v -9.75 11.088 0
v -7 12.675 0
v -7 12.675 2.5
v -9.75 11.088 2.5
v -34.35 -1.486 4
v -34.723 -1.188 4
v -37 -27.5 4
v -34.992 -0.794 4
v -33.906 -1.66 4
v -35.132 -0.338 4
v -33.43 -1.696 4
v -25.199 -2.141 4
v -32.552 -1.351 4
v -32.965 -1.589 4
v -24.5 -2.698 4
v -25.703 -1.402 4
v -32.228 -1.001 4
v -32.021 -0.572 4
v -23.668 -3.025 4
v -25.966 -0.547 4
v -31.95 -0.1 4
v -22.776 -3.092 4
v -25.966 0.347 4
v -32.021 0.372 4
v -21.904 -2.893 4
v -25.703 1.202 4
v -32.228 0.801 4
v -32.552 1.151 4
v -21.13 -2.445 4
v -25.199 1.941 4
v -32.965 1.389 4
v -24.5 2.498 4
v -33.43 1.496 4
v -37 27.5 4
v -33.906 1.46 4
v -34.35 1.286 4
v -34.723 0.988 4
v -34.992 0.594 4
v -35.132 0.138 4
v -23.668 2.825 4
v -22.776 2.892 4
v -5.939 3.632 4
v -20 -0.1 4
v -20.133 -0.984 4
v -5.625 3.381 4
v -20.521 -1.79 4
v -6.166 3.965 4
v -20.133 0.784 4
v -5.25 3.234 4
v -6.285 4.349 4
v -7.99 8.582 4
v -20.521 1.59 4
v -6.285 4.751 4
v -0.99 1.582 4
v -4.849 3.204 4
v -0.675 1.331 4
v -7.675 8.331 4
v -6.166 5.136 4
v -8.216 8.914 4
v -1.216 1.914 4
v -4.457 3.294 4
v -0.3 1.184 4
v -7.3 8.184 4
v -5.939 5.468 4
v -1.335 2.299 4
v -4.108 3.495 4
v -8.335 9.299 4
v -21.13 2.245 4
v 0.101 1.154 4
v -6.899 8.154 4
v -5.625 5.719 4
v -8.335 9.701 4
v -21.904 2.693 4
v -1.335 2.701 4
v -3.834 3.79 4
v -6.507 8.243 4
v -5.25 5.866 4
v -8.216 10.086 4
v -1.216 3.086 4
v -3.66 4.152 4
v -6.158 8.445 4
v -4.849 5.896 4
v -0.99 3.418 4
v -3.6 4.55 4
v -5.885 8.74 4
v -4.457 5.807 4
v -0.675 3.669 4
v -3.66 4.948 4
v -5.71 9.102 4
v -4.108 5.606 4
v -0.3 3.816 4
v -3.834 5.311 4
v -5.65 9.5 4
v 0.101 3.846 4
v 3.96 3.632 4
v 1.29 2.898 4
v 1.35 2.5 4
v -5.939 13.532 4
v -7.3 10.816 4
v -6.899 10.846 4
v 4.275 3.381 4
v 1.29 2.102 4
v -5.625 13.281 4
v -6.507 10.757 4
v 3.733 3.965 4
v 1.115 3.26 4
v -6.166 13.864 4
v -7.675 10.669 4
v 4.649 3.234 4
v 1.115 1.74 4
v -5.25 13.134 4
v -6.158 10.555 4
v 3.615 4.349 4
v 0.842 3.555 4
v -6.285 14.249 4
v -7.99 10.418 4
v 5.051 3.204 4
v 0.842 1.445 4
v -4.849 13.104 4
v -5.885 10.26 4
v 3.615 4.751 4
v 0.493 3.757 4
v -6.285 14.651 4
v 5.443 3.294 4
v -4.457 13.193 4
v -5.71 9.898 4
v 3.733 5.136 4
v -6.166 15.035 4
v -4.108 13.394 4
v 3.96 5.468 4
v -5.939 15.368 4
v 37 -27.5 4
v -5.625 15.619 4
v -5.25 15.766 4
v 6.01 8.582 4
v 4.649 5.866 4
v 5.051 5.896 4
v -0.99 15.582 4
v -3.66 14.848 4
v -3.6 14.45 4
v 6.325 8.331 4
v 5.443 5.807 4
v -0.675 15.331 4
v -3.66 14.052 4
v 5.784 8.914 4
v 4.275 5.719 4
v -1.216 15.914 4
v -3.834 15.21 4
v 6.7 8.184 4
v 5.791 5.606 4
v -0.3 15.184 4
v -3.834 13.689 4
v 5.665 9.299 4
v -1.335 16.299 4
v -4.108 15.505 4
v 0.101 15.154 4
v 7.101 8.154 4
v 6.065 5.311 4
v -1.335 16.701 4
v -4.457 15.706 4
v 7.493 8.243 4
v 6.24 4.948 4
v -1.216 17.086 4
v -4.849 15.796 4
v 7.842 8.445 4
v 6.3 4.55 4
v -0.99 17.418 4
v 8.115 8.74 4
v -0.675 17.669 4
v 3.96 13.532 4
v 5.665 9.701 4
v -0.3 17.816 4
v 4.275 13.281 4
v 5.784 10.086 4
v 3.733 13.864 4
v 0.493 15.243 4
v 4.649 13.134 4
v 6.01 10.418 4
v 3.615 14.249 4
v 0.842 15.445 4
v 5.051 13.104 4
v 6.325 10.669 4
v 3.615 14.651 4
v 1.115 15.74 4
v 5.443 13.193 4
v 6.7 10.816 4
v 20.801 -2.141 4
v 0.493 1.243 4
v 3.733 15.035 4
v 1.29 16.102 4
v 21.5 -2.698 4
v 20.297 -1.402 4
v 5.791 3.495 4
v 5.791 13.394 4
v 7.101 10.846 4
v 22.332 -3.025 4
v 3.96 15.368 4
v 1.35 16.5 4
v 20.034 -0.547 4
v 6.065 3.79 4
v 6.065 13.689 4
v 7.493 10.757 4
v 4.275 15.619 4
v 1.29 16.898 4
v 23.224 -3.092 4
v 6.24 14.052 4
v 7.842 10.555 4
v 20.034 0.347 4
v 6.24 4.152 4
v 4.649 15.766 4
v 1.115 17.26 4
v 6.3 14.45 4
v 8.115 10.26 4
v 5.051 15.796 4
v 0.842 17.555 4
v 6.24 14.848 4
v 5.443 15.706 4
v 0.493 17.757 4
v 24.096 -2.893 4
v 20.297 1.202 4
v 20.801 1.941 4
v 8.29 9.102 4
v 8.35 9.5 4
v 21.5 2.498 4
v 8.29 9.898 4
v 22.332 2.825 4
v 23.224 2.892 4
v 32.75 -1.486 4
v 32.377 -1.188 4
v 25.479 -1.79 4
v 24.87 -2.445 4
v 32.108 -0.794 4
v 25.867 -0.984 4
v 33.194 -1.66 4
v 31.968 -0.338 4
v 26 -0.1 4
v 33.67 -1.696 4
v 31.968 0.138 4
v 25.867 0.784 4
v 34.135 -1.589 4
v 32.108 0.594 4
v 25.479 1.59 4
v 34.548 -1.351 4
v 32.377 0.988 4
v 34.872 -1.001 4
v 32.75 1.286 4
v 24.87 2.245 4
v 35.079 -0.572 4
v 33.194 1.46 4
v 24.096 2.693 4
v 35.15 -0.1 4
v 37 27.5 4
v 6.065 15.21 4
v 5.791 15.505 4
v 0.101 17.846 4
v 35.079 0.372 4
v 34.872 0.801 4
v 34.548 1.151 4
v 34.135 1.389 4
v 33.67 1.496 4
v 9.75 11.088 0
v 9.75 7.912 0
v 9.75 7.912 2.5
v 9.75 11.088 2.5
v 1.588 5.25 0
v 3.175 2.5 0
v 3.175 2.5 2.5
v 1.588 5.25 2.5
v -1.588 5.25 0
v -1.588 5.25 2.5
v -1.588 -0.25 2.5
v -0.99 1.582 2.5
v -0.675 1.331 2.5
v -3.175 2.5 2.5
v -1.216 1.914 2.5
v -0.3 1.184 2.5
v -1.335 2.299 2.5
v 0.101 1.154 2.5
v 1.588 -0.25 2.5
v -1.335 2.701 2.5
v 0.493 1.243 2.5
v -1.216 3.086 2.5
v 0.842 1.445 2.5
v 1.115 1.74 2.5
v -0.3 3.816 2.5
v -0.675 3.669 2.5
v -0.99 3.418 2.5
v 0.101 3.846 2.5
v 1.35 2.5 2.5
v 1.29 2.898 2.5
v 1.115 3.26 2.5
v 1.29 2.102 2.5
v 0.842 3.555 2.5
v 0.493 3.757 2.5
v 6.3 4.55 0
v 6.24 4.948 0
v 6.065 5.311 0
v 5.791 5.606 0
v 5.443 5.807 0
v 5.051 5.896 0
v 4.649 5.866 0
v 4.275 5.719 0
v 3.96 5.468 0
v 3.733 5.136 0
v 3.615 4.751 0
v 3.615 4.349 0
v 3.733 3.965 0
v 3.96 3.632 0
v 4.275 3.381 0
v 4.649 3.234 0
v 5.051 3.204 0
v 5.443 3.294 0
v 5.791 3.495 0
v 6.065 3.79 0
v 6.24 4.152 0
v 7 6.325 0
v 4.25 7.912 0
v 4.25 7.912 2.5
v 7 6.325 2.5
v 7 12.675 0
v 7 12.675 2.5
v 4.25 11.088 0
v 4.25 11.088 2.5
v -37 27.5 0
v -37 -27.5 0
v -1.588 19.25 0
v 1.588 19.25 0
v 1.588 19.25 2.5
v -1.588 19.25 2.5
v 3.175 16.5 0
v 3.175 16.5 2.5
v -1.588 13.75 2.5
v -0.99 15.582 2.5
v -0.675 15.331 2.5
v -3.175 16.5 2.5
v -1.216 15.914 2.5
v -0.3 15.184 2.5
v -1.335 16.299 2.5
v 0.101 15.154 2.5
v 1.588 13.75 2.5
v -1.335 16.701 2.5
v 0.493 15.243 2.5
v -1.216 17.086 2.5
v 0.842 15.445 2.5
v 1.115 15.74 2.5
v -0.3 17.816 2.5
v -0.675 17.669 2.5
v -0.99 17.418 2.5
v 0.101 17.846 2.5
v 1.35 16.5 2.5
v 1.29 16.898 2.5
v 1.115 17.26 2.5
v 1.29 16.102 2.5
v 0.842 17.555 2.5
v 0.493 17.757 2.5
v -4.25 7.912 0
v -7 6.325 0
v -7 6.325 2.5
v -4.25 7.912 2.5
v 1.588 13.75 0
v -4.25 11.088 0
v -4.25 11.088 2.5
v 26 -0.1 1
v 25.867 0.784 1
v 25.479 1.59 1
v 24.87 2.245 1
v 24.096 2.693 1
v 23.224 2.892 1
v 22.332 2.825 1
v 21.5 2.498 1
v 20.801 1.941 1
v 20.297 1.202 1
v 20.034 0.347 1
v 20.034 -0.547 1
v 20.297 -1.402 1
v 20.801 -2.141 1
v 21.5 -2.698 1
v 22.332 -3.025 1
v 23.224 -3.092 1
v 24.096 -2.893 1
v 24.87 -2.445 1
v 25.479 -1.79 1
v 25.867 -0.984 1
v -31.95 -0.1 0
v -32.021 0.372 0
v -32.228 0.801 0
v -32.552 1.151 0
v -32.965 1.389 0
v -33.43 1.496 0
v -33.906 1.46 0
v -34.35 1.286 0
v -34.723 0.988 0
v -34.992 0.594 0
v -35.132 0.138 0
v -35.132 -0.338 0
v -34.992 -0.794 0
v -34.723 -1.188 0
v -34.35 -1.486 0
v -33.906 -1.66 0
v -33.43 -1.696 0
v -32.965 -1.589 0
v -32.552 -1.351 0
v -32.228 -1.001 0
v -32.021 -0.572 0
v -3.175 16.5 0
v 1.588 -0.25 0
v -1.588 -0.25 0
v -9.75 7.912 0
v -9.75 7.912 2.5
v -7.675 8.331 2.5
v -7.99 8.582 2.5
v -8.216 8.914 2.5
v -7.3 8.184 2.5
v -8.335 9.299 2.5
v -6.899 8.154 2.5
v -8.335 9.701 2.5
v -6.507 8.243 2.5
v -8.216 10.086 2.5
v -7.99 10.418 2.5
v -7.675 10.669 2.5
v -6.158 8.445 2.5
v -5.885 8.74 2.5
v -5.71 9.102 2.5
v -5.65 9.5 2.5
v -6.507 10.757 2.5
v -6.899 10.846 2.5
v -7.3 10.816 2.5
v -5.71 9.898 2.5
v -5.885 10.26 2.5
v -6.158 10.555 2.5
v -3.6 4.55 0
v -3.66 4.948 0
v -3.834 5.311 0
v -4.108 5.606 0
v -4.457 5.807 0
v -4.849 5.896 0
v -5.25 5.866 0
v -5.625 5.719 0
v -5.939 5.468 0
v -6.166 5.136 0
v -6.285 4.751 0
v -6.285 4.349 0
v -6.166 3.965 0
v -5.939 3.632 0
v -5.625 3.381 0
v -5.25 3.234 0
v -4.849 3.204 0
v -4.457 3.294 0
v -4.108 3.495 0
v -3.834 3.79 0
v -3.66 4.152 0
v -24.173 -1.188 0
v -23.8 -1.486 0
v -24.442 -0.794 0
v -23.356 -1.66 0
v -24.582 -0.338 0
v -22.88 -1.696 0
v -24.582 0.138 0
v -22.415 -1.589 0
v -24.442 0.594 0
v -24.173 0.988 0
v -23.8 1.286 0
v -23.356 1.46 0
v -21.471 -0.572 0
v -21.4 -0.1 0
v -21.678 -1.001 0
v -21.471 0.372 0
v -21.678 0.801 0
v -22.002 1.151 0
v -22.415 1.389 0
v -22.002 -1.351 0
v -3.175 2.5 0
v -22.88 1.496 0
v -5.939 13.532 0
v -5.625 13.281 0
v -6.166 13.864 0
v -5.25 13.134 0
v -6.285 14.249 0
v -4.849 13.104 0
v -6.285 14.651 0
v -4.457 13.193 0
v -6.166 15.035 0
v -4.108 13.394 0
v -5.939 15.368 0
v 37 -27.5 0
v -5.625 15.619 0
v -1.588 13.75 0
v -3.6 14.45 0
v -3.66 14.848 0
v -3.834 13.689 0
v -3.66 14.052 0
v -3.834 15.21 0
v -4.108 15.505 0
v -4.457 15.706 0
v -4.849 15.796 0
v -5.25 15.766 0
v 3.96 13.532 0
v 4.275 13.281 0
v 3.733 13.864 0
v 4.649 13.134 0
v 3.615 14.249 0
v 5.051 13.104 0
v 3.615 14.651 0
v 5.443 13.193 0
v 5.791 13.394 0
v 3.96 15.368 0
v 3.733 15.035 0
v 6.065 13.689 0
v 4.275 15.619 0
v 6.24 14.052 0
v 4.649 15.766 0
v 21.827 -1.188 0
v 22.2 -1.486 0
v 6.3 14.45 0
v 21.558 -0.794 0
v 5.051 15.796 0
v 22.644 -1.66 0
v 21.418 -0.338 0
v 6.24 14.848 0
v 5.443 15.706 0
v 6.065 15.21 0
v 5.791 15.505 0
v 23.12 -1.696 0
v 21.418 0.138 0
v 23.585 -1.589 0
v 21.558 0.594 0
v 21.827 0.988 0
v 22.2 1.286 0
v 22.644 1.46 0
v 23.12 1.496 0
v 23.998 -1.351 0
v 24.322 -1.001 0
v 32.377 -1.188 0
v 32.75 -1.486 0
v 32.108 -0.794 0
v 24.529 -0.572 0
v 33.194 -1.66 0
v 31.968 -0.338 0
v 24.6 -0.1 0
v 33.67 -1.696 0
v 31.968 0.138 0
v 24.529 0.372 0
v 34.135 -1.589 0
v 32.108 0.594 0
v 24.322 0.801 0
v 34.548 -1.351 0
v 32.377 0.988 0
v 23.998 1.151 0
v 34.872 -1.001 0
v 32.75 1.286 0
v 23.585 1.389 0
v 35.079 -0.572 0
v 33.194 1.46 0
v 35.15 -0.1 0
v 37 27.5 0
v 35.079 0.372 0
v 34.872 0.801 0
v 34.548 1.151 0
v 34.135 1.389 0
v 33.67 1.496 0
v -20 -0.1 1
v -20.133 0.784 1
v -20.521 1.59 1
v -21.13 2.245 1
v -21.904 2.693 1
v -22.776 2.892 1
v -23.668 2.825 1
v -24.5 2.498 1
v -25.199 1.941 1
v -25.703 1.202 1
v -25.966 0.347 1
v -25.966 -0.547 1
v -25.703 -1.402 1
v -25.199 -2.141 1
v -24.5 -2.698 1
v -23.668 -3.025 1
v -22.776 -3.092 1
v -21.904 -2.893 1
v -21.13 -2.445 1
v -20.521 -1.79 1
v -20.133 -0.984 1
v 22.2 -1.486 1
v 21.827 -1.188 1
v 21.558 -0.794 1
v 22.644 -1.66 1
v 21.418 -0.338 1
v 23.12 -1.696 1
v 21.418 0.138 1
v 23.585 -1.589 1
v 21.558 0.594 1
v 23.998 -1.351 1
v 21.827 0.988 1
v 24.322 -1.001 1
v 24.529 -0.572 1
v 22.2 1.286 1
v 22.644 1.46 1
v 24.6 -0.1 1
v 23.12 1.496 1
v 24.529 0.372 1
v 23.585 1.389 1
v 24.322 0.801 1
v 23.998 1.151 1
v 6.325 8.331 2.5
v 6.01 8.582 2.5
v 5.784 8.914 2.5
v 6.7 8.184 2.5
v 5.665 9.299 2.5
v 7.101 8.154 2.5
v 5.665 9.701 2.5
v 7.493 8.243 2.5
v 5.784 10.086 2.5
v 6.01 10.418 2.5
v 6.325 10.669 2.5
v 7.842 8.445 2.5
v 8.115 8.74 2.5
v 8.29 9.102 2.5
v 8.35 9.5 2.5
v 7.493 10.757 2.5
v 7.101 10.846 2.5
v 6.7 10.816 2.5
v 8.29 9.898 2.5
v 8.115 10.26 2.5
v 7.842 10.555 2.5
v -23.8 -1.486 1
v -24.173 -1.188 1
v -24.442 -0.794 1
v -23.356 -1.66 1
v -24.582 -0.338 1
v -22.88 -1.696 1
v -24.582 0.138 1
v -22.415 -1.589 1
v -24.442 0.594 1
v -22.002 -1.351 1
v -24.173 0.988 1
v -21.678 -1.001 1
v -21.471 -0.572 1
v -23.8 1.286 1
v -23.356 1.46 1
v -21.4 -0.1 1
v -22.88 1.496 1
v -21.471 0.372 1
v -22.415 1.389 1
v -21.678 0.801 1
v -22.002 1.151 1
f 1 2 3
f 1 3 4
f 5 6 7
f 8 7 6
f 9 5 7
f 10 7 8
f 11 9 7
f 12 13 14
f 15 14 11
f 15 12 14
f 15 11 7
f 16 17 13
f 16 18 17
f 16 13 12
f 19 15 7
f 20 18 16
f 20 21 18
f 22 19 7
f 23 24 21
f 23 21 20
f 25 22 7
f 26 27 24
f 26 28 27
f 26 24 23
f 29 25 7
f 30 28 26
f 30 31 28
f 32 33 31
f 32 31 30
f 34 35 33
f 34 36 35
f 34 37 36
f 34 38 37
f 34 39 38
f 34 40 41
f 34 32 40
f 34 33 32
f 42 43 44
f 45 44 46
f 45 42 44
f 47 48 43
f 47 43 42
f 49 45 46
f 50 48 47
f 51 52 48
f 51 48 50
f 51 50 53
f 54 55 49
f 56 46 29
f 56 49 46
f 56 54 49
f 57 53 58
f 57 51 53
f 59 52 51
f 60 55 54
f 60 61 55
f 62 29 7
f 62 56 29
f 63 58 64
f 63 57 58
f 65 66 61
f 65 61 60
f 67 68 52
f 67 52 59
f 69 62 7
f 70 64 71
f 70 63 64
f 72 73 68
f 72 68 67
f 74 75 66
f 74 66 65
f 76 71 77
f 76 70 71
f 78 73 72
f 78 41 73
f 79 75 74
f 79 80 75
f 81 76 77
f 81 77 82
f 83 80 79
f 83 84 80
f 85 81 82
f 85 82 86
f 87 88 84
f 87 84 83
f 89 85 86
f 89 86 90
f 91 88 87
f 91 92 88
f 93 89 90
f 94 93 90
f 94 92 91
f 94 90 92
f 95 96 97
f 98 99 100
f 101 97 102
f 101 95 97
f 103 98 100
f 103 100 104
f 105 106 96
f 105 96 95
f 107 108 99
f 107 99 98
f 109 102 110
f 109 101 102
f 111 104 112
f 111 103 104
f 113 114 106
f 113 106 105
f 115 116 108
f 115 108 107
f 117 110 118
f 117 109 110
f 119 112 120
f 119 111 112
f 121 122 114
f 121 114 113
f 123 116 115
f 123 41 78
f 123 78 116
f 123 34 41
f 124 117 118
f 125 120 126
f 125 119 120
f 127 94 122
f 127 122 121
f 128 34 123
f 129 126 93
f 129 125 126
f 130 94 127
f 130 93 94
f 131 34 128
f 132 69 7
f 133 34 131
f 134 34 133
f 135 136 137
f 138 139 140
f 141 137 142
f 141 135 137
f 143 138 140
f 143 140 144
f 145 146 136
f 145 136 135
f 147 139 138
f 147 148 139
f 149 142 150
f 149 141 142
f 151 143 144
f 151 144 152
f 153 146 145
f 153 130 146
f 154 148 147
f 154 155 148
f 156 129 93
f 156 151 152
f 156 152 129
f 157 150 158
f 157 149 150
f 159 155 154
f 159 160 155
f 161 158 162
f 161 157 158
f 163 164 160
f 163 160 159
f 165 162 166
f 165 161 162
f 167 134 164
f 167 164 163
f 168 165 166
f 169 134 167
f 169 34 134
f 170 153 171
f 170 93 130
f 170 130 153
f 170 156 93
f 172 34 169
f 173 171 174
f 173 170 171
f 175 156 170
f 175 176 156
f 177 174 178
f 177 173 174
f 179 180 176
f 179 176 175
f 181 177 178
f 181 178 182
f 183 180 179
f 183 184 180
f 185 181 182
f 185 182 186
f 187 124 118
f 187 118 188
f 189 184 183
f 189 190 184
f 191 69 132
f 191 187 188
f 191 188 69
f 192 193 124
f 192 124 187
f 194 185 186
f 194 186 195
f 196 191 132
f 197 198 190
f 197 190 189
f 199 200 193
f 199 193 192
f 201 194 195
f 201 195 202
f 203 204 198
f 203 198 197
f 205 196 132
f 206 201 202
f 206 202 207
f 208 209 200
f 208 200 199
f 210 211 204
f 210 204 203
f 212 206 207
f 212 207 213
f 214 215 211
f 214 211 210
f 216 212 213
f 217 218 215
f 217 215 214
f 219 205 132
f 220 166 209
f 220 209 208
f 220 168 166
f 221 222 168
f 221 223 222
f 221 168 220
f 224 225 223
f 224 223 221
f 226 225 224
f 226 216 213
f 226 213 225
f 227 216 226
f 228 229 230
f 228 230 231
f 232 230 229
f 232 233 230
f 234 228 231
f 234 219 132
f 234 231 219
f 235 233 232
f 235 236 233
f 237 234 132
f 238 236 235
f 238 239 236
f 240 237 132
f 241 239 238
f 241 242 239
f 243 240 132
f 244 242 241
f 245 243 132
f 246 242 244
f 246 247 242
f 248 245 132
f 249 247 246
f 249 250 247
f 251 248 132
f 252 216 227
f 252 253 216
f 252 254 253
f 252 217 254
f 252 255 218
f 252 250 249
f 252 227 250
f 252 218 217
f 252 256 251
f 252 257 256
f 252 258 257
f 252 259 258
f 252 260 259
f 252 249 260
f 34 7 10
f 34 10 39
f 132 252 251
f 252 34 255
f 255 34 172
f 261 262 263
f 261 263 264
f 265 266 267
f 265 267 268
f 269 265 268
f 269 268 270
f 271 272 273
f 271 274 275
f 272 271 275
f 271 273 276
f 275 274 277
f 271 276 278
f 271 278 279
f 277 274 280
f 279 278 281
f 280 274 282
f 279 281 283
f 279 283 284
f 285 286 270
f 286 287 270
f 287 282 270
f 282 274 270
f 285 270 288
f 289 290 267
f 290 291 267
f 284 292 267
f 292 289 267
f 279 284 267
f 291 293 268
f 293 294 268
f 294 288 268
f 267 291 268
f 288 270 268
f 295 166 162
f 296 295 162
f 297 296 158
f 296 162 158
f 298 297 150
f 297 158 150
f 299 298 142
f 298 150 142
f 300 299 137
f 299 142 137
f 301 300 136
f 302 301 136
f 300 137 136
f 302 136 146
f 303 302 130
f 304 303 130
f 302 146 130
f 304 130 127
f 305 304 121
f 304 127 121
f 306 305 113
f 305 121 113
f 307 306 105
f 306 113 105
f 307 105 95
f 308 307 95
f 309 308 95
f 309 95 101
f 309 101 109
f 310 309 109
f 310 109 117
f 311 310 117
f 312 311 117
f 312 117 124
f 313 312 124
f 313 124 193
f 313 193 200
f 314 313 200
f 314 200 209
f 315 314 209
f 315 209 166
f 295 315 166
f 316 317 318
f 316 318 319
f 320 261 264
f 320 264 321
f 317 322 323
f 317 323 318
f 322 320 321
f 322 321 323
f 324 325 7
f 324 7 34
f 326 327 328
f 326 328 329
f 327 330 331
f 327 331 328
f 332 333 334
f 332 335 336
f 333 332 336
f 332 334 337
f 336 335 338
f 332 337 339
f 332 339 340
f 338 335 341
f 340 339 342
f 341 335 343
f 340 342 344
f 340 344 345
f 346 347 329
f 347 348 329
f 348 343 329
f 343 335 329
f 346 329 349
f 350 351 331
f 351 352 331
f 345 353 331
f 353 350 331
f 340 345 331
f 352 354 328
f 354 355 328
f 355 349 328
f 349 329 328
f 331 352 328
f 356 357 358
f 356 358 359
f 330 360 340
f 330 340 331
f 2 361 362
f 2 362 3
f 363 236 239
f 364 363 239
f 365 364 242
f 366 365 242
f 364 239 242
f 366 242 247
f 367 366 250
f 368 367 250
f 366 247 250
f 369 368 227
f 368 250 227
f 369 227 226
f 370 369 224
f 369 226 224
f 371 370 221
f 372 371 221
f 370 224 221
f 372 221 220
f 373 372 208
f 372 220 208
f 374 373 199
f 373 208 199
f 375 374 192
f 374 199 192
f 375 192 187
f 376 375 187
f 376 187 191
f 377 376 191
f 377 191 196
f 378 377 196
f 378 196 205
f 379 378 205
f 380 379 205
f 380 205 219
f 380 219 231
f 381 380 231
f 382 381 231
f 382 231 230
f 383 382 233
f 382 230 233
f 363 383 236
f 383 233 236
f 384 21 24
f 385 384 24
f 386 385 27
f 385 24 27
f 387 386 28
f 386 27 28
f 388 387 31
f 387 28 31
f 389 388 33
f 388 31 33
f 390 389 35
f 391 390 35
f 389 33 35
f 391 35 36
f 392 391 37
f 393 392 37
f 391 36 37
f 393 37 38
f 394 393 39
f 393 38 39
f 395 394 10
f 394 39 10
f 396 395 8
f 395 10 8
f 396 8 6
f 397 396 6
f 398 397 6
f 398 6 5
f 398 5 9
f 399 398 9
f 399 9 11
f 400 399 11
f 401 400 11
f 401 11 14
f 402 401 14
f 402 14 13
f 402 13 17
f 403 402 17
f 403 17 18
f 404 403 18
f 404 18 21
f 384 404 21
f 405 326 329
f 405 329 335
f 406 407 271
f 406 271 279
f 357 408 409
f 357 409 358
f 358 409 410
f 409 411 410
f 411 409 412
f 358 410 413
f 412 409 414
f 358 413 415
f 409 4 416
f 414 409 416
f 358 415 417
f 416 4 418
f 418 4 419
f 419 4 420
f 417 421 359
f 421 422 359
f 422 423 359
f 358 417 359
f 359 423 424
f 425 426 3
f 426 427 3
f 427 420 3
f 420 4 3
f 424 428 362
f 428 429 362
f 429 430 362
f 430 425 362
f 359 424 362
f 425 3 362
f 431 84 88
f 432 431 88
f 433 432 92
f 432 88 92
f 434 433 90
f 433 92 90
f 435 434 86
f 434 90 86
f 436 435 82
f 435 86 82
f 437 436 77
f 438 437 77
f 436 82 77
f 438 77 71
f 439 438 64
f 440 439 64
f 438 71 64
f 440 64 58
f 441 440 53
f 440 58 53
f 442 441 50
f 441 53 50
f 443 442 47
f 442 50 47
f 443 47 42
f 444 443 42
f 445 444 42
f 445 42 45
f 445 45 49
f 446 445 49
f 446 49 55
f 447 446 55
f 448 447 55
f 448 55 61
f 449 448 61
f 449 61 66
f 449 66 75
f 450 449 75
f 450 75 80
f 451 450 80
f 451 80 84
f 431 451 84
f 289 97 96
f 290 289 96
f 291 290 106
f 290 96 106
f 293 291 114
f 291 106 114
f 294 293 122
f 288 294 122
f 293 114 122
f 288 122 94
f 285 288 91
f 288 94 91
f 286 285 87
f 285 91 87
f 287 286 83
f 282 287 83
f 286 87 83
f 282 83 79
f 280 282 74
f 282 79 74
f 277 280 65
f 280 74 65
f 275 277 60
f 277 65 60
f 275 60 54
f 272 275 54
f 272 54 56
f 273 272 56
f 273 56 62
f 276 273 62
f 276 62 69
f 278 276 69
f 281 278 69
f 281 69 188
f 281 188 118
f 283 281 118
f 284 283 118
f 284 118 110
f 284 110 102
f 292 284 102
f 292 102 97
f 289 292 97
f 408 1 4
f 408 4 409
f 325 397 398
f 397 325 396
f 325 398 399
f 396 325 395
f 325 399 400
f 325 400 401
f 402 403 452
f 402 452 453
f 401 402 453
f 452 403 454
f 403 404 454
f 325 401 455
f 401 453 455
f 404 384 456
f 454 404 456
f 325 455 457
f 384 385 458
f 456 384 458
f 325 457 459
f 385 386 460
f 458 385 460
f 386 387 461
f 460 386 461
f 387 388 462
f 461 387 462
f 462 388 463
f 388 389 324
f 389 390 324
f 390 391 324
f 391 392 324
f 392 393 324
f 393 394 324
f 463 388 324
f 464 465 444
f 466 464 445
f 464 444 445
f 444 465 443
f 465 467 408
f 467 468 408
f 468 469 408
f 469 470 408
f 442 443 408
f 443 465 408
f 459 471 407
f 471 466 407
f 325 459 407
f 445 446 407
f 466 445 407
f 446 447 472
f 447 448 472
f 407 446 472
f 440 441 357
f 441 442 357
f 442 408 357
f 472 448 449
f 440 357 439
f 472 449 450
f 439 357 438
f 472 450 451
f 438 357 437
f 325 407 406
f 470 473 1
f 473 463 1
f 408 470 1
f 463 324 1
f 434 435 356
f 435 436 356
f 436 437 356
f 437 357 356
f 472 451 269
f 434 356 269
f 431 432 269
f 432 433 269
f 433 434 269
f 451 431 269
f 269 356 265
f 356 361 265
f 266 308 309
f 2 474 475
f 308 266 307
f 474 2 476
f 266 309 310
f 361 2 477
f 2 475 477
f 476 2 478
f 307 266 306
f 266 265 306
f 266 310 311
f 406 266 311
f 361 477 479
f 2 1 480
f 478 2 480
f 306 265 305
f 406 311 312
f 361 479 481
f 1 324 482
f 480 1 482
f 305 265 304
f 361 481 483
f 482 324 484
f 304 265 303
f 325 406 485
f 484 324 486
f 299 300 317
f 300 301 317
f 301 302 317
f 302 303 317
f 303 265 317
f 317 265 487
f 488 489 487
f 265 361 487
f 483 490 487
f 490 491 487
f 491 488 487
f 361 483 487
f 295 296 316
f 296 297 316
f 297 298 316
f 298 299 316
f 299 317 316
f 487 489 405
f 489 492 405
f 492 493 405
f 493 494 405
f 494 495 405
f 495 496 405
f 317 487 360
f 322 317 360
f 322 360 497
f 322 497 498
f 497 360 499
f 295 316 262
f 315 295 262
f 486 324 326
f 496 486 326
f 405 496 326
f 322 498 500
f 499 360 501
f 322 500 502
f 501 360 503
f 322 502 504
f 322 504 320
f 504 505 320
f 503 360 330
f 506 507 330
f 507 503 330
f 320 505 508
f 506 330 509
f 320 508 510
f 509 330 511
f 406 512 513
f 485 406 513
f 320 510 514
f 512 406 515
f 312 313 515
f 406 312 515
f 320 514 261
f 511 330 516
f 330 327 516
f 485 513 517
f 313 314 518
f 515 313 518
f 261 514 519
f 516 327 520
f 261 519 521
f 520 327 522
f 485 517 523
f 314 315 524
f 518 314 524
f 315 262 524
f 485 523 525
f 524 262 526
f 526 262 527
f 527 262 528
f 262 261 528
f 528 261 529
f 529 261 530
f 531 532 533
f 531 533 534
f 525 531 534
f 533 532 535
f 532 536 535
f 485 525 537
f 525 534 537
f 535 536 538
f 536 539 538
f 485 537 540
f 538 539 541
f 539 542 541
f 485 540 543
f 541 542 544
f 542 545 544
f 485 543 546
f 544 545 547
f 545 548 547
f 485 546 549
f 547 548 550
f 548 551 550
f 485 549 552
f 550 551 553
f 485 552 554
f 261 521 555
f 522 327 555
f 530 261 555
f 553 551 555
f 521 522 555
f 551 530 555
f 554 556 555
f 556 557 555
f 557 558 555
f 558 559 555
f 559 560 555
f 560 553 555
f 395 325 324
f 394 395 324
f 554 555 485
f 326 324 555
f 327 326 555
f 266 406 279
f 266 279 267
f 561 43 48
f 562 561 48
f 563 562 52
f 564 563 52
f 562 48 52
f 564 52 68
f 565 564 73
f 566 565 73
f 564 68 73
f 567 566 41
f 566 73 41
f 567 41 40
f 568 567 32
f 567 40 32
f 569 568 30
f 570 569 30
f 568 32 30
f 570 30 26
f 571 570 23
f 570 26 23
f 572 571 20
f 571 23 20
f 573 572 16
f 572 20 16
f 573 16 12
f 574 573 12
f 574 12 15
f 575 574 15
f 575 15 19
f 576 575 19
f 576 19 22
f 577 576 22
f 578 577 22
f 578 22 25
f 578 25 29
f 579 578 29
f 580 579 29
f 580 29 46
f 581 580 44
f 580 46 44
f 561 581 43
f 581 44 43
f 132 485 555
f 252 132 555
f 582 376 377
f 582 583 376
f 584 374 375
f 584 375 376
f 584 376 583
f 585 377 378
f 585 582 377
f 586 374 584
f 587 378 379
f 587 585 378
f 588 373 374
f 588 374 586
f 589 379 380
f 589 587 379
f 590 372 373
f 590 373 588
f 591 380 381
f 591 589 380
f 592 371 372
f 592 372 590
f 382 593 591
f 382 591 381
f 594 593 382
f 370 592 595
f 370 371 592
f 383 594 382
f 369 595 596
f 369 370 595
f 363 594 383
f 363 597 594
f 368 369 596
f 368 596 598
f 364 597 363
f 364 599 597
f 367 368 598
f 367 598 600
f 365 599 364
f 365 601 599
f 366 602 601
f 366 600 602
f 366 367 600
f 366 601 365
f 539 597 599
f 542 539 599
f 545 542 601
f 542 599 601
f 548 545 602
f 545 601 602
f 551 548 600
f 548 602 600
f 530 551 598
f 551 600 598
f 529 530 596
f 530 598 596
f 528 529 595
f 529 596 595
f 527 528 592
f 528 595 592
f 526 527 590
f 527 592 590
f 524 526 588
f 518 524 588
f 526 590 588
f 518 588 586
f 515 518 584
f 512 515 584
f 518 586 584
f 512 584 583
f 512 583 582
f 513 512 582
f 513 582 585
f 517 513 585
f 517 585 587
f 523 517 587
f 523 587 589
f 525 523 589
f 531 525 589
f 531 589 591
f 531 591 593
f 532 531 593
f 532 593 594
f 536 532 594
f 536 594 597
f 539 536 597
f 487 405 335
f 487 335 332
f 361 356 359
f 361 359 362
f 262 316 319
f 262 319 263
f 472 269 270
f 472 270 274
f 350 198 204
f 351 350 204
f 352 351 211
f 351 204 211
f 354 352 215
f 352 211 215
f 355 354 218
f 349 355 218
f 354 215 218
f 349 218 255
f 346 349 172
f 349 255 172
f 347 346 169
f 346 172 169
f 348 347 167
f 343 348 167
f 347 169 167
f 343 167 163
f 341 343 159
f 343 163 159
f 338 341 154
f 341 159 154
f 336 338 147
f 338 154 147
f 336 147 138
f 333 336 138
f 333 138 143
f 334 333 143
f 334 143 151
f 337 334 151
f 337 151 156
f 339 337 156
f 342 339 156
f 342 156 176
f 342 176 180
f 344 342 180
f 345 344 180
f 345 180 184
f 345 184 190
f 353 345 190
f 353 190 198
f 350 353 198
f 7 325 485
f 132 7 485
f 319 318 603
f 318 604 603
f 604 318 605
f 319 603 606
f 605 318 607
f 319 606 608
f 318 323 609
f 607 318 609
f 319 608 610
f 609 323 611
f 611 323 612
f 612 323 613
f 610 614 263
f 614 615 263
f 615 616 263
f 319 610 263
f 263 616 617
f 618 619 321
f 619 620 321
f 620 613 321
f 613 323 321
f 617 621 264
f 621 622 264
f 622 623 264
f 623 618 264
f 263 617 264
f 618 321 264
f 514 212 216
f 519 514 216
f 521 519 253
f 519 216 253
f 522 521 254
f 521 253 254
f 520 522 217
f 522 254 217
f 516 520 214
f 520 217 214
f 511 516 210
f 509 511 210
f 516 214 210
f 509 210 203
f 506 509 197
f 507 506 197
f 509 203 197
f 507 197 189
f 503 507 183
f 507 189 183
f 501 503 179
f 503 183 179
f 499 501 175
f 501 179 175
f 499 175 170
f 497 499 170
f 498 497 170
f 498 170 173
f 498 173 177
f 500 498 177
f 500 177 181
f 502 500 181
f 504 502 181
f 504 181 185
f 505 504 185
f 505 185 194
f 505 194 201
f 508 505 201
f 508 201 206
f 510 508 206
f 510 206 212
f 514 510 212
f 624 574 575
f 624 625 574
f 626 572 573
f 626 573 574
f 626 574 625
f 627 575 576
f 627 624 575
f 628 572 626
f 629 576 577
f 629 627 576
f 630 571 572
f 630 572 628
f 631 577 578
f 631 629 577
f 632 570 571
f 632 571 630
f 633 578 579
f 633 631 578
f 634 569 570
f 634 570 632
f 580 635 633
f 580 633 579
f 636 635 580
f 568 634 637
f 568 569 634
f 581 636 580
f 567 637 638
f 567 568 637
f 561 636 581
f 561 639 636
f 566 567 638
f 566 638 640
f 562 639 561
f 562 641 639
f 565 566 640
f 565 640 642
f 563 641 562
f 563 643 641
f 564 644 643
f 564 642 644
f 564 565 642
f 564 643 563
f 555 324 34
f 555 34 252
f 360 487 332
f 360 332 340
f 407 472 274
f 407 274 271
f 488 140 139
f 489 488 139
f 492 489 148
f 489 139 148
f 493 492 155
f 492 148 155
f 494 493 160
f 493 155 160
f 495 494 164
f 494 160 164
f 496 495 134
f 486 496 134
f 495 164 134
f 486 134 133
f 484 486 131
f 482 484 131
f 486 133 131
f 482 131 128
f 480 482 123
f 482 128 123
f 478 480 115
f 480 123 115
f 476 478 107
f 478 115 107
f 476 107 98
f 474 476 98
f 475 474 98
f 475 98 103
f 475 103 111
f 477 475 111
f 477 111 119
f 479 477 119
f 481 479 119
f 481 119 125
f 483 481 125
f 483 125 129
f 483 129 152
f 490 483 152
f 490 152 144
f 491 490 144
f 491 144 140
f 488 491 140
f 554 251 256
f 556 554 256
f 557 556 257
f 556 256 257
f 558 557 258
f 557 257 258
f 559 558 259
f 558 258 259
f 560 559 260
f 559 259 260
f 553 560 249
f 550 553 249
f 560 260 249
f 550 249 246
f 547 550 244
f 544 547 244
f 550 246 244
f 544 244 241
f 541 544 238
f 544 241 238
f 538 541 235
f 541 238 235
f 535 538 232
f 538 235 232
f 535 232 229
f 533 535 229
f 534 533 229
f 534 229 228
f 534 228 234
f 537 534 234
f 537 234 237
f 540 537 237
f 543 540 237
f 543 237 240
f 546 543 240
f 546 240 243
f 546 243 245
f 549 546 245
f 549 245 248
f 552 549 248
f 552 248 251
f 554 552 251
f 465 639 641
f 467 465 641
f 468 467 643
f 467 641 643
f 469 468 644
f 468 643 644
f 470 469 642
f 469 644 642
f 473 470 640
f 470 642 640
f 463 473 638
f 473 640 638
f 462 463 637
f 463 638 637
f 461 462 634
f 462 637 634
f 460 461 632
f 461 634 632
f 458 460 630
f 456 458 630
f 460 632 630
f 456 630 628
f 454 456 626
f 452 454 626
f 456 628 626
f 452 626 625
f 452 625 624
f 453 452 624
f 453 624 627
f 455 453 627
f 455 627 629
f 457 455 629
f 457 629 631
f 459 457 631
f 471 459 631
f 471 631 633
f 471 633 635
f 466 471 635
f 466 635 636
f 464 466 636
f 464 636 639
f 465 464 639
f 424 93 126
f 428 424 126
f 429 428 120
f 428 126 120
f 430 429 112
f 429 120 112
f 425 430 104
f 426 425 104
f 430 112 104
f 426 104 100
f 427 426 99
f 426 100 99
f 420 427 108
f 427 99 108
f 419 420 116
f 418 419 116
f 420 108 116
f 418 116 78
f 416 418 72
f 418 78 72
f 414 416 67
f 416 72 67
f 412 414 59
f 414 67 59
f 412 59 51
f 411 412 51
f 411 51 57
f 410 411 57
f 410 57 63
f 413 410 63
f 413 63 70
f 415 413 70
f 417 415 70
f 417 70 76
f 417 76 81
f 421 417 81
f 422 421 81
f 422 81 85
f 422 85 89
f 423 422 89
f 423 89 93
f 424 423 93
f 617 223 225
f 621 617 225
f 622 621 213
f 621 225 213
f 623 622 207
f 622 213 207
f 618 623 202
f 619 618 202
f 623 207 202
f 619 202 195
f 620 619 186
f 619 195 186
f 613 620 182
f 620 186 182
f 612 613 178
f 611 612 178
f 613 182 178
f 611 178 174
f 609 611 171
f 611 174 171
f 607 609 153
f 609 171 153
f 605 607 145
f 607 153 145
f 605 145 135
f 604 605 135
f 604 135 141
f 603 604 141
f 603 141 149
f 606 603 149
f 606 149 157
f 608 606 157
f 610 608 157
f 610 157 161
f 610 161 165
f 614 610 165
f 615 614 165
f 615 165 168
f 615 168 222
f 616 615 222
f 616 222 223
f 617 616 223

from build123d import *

# Parameters (mm, degrees)
SKETCH_1_W          = 74
SKETCH_1_H          = 55
EXTRUDE_1_DEPTH     = 4
SKETCH_2_R          = 1.6
CUT_EXTRUDE_1_DEPTH = 5
SKETCH_2_3_R        = 1.35
CUT_EXTRUDE_2_DEPTH = 5
CUT_EXTRUDE_3_DEPTH = 2.5
SKETCH_5_R          = 3
CUT_EXTRUDE_4_DEPTH = 3


with BuildPart() as part:
    # 草圖1 → 填料-伸長1 (new body)
    with BuildSketch(Plane.XY):
        Rectangle(SKETCH_1_W, SKETCH_1_H)
    extrude(amount=EXTRUDE_1_DEPTH)

    # 草圖2 → 除料-伸長1 (cut, through all)
    with BuildSketch(Plane.XY.offset(4)):
        with Locations((-33.55, -0.1)):
            Circle(SKETCH_2_R)
        with Locations((33.55, -0.1)):
            Circle(SKETCH_2_R)
        with Locations((-23, -0.1)):
            Circle(SKETCH_2_R)
        with Locations((23, -0.1)):
            Circle(SKETCH_2_R)
    extrude(amount=-CUT_EXTRUDE_1_DEPTH, mode=Mode.SUBTRACT)

    # 草圖2<3> → 除料-伸長2 (cut, through all)
    with BuildSketch(Plane.XY.offset(4)):
        with Locations((0, 2.5)):
            Circle(SKETCH_2_3_R)
        with Locations((4.949747468, 4.550252532)):
            Circle(SKETCH_2_3_R)
        with Locations((7, 9.5)):
            Circle(SKETCH_2_3_R)
        with Locations((4.949747468, 14.449747468)):
            Circle(SKETCH_2_3_R)
        with Locations((-4.949747468, 14.449747468)):
            Circle(SKETCH_2_3_R)
        with Locations((-7, 9.5)):
            Circle(SKETCH_2_3_R)
        with Locations((-4.949747468, 4.550252532)):
            Circle(SKETCH_2_3_R)
        with Locations((0, 16.5)):
            Circle(SKETCH_2_3_R)
    extrude(amount=-CUT_EXTRUDE_2_DEPTH, mode=Mode.SUBTRACT)

    # 草圖3 → 除料-伸長3 (cut)
    with BuildSketch(Plane(origin=(0, 0, 0), x_dir=(-1, 0, 0), z_dir=(0, 0, -1))):
        Polygon((-1.58771324, 19.25), (1.58771324, 19.25), (3.175426481, 16.5), (1.58771324, 13.75), (-1.58771324, 13.75), (-3.175426481, 16.5), align=None)
        Polygon((9.75, 7.91228676), (7, 6.324573519), (4.25, 7.91228676), (4.25, 11.08771324), (7, 12.675426481), (9.75, 11.08771324), align=None)
        Polygon((-1.58771324, -0.25), (-3.175426481, 2.5), (-1.58771324, 5.25), (1.58771324, 5.25), (3.175426481, 2.5), (1.58771324, -0.25), align=None)
        Polygon((-9.75, 11.08771324), (-7, 12.675426481), (-4.25, 11.08771324), (-4.25, 7.91228676), (-7, 6.324573519), (-9.75, 7.91228676), align=None)
    extrude(amount=-CUT_EXTRUDE_3_DEPTH, mode=Mode.SUBTRACT)

    # 草圖5 → 除料-伸長4 (cut)
    with BuildSketch(Plane.XY.offset(4)):
        with Locations((23, -0.1)):
            Circle(SKETCH_5_R)
        with Locations((-23, -0.1)):
            Circle(SKETCH_5_R)
    extrude(amount=-CUT_EXTRUDE_4_DEPTH, mode=Mode.SUBTRACT)


solid = part.part
